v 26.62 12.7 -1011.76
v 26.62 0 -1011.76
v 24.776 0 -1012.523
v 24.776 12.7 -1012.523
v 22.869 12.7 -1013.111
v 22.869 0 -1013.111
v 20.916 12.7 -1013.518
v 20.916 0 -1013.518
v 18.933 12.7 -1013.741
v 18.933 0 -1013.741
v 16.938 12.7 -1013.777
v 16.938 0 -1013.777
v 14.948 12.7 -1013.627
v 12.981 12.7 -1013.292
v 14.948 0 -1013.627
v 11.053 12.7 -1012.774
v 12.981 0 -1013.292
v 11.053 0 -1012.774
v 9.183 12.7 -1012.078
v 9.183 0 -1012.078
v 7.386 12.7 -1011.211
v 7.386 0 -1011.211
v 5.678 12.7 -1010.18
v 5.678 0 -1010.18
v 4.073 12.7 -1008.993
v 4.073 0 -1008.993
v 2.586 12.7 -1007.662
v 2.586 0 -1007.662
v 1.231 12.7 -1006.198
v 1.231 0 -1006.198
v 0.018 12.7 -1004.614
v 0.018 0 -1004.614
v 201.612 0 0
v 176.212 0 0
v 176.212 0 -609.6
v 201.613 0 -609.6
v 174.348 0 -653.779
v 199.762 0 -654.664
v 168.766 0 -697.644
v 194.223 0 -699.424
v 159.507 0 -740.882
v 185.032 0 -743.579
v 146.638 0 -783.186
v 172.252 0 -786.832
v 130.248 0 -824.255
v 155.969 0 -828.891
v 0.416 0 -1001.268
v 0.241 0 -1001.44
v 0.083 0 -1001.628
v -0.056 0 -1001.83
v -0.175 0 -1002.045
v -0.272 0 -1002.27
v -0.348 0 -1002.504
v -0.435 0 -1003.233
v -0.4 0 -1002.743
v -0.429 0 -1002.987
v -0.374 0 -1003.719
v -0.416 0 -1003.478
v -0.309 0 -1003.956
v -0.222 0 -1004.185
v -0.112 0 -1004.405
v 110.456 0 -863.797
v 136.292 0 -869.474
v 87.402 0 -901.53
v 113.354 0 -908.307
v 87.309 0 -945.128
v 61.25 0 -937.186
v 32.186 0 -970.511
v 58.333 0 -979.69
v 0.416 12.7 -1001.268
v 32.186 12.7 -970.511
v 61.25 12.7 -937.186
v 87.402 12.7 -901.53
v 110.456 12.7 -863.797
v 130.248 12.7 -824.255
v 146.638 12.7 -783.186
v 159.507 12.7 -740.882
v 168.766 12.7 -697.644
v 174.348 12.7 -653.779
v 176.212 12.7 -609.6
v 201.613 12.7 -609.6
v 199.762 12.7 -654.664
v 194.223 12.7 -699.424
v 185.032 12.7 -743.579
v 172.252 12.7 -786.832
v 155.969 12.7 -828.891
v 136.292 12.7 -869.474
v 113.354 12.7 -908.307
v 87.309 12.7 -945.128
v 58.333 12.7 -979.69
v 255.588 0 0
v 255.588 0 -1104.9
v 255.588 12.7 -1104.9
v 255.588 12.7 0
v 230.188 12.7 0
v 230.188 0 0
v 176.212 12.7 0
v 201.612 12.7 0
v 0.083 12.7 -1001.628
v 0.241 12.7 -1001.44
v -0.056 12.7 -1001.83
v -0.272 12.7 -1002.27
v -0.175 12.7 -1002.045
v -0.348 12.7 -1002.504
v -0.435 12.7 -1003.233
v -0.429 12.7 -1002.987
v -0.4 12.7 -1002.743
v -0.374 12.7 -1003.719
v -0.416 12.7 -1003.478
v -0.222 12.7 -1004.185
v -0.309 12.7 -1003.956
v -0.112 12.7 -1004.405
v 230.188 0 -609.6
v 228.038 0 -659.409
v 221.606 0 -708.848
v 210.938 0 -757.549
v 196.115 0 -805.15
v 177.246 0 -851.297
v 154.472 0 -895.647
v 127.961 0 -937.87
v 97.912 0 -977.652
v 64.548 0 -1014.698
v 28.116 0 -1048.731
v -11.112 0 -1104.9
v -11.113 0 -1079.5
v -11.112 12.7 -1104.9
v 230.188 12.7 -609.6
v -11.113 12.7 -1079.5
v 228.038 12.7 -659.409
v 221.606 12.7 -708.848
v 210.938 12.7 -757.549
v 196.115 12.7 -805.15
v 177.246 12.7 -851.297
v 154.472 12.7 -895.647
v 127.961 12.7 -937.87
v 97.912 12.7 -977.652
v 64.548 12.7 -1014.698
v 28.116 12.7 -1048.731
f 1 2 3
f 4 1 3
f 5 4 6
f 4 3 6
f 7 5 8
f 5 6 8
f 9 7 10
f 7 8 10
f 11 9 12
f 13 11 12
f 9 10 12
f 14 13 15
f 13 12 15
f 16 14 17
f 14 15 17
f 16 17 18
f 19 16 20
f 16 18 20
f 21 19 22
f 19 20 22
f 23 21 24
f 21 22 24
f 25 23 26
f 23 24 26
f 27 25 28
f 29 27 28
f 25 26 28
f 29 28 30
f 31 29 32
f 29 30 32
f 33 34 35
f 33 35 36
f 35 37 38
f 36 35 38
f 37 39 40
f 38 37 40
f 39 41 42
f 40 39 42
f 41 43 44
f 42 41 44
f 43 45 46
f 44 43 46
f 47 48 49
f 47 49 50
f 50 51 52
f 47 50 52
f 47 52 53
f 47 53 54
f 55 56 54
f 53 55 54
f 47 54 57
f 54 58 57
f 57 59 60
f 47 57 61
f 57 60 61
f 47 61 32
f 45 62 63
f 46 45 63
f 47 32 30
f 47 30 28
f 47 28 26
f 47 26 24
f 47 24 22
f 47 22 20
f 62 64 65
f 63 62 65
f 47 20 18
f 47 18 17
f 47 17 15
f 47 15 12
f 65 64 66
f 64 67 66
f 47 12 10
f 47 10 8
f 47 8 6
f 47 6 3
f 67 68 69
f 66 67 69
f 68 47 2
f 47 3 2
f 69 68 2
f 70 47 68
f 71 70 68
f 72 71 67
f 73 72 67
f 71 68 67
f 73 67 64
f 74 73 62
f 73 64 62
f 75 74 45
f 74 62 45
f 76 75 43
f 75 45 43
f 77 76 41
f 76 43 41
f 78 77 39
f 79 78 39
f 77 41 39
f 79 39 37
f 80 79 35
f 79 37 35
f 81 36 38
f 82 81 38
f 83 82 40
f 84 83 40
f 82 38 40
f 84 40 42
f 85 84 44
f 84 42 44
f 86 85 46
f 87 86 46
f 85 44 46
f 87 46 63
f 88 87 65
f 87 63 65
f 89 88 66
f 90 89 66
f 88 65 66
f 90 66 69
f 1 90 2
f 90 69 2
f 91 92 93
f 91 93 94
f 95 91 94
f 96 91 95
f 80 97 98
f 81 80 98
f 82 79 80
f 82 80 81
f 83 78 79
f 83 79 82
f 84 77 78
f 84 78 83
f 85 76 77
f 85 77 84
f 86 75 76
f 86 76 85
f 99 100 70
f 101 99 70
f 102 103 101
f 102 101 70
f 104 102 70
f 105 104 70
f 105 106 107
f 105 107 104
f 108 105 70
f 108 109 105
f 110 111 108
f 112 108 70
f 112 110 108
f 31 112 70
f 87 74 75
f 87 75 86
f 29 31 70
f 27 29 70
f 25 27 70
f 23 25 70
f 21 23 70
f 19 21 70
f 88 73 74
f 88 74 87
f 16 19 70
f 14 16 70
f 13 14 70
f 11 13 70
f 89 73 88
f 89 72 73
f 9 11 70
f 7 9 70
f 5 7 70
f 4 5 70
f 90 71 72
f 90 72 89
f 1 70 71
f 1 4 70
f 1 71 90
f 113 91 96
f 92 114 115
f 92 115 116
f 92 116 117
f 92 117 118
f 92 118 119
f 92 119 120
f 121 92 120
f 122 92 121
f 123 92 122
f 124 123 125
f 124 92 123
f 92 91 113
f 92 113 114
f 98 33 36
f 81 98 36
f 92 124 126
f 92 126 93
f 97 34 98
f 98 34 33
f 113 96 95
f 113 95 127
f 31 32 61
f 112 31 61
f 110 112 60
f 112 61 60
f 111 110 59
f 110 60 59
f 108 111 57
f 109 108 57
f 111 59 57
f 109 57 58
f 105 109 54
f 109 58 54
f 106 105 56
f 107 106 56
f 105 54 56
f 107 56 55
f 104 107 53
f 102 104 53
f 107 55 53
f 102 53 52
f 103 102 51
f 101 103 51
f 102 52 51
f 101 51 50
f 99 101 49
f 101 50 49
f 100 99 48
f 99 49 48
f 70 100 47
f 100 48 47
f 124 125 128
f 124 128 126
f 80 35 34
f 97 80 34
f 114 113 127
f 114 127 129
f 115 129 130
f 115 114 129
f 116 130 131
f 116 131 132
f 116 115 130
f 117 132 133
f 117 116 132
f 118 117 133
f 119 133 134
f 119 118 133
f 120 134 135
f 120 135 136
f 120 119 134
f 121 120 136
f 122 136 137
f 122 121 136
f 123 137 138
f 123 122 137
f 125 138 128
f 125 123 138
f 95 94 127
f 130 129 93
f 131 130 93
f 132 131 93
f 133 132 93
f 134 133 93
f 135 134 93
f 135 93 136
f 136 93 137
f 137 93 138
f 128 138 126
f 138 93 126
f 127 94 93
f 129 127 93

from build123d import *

# Parameters (mm, degrees)
BOSS_EXTRUDE1_DEPTH   = 12.7
BOSS_EXTRUDE1_2_DEPTH = 12.7


with BuildPart() as part:
    # Sketch2 → Boss-Extrude1 (new body)
    with BuildSketch(Plane(origin=(0, 0, 0), x_dir=(1, 0, 0), z_dir=(0, 1, 0))):
        with BuildLine():
            Line((230.1875, 0), (230.1875, 609.6))
            ThreePointArc((230.1875, 609.6), (166.336893569, 873.717256157), (-11.1125, 1079.5))
            Line((-11.1125, 1079.5), (-11.1125, 1104.9))
            Line((-11.1125, 1104.9), (255.5875, 1104.9))
            Line((255.5875, 1104.9), (255.5875, 0))
            Line((255.5875, 0), (230.1875, 0))
        make_face()
    extrude(amount=BOSS_EXTRUDE1_DEPTH)


with BuildPart() as body_2:
    # Sketch2 → Boss-Extrude1 2 (new body)
    with BuildSketch(Plane(origin=(0, 0, 0), x_dir=(1, 0, 0), z_dir=(0, 1, 0))):
        with BuildLine():
            Line((176.2125, 0), (201.6125, 0))
            Line((201.6125, 0), (201.6125, 609.6))
            ThreePointArc((201.6125, 609.6), (155.969091122, 828.891484249), (26.619962964, 1011.759958522))
            ThreePointArc((26.619962964, 1011.759958522), (12.010979758, 1013.05521959), (0.017727249, 1004.613538133))
            ThreePointArc((0.017727249, 1004.613538133), (-0.417598286, 1002.865028377), (0.416364306, 1001.267749102))
            ThreePointArc((0.416364306, 1001.267749102), (130.248330899, 824.255483864), (176.2125, 609.6))
            Line((176.2125, 609.6), (176.2125, 0))
        make_face()
    extrude(amount=BOSS_EXTRUDE1_2_DEPTH)


solid = Compound([part.part, body_2.part])
